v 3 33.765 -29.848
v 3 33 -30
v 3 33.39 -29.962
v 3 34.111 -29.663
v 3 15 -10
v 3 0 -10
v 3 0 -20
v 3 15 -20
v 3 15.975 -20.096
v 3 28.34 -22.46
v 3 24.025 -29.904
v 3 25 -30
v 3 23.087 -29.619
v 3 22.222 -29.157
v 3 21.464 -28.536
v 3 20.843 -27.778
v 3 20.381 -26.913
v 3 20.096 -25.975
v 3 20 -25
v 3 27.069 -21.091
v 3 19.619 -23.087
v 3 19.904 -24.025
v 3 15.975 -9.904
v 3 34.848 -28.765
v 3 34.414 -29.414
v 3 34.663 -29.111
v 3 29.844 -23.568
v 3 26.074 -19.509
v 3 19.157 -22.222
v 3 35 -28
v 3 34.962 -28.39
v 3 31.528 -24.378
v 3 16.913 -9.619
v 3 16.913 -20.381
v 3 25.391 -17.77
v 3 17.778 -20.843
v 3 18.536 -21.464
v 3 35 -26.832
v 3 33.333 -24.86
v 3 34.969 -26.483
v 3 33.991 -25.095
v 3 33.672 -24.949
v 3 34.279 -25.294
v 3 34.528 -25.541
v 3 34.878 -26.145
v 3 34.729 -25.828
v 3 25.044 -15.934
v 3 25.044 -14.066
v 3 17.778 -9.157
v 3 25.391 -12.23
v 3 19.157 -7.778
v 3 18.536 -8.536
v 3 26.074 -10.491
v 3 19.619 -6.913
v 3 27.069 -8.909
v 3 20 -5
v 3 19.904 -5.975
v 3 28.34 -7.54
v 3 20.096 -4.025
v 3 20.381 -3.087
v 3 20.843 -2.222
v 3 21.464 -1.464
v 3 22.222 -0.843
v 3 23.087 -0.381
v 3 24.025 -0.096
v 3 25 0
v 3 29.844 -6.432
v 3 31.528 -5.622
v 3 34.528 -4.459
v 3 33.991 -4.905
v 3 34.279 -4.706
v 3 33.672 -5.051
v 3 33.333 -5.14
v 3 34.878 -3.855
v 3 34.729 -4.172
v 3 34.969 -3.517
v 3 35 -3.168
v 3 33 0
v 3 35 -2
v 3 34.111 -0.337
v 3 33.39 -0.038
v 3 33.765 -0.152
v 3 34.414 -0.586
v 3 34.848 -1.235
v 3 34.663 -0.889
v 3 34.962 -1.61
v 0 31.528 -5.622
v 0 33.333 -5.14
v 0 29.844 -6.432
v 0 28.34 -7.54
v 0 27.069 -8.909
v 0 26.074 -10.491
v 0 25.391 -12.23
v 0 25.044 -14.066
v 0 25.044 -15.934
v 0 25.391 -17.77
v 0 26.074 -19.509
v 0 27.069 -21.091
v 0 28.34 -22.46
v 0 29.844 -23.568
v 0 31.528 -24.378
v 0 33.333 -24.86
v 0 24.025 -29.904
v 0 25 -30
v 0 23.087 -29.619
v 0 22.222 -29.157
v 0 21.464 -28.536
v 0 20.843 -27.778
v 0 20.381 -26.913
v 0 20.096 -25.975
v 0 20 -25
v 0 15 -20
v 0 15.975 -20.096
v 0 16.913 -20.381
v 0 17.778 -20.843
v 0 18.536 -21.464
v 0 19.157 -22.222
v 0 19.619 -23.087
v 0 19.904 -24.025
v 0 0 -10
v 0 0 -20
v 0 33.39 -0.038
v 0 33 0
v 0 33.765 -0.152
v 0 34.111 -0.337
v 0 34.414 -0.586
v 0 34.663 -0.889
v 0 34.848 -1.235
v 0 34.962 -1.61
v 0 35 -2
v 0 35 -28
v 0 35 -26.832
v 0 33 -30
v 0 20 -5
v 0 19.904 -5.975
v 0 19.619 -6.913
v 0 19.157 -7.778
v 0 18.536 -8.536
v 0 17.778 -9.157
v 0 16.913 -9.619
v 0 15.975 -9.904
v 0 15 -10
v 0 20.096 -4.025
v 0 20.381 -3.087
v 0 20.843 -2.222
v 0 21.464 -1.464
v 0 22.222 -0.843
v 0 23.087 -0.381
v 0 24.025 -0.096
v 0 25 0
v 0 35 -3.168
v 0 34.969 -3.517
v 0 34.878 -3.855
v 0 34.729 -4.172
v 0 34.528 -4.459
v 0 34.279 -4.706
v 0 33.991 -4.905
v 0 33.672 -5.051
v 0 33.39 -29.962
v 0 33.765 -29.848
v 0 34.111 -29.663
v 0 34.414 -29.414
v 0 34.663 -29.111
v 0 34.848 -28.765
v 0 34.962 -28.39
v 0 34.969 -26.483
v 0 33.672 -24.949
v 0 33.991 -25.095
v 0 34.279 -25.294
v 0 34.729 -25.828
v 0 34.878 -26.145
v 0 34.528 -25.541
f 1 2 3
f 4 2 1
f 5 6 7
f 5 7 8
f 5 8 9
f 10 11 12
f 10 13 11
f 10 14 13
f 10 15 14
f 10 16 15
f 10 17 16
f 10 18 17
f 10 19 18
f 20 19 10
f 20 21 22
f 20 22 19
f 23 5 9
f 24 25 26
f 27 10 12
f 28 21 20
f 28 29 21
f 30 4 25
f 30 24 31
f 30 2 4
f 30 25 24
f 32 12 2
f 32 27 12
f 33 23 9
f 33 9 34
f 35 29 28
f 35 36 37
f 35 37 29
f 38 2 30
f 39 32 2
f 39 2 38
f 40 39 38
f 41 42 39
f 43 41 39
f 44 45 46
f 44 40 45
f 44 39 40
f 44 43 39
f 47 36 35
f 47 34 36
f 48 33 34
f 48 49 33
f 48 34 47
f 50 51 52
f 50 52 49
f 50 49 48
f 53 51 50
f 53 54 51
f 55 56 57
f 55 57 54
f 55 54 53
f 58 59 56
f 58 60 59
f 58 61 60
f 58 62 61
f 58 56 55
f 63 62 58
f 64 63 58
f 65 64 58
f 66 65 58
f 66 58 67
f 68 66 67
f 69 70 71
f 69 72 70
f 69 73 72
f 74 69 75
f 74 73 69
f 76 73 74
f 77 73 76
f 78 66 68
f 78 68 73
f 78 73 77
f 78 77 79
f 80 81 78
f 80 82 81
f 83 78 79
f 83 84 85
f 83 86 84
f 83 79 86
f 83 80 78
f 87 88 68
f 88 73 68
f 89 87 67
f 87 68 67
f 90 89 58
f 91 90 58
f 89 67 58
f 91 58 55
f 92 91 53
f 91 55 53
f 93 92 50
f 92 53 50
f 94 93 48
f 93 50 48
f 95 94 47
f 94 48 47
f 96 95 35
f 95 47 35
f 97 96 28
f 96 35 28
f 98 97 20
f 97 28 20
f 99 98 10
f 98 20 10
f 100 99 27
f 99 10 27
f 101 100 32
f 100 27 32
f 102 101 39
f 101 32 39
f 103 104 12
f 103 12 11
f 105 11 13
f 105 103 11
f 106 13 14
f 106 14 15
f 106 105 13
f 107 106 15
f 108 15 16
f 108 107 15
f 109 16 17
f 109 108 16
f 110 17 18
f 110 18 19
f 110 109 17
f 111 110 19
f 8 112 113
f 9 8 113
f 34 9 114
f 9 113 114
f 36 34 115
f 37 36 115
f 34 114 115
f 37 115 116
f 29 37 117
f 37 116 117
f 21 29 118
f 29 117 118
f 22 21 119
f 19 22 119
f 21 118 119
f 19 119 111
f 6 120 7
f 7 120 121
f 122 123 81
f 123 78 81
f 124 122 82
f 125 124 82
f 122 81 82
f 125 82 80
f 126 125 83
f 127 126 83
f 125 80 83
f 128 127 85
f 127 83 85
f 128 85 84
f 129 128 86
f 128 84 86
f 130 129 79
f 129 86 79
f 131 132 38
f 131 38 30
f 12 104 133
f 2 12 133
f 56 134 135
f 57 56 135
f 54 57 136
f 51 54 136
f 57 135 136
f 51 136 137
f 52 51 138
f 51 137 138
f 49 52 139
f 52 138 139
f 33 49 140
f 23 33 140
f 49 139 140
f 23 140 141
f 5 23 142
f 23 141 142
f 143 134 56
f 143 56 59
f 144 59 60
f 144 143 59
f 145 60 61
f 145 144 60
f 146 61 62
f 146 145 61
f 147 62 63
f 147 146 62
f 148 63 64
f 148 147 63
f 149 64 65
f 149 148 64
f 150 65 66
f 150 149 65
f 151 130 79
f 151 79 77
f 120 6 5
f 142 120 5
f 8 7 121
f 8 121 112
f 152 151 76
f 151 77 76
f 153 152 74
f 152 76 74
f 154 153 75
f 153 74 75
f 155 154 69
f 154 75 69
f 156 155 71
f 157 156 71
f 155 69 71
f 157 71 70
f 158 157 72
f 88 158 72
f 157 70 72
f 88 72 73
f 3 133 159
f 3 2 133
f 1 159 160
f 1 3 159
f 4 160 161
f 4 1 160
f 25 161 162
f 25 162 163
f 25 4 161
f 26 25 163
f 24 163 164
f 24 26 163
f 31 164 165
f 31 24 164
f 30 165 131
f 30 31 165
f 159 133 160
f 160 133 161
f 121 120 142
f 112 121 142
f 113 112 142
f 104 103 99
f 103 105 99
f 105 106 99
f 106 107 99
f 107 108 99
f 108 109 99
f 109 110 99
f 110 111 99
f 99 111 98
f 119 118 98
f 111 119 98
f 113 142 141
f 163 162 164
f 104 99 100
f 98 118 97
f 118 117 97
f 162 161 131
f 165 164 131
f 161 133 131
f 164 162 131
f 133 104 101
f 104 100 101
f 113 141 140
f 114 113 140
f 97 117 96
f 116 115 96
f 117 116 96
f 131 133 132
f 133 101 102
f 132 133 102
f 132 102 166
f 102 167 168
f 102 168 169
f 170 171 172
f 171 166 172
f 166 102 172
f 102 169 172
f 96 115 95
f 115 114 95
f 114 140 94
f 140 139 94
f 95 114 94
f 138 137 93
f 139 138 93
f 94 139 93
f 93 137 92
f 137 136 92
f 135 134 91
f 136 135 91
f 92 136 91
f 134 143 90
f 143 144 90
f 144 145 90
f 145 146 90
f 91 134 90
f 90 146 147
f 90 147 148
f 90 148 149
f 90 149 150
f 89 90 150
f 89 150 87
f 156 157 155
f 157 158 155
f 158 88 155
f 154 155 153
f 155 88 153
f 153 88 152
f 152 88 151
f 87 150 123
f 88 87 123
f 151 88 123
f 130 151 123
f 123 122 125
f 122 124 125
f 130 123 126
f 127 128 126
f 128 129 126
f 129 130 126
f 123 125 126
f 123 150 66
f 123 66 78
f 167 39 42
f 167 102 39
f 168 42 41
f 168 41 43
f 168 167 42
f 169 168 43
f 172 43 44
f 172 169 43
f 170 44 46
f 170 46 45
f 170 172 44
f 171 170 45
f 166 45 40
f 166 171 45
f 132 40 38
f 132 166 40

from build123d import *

# Parameters (mm, degrees)
SKETCH1_W           = 30
SKETCH1_H           = 35
BOSS_EXTRUDE1_DEPTH = 3
SKETCH2_W           = 10
SKETCH2_H           = 20
CUT_EXTRUDE1_DEPTH  = 3
SKETCH5_R           = 10
CUT_EXTRUDE2_DEPTH  = 3
FILLET1_DEPTH       = 3
FILLET1_2_DEPTH     = 3
FILLET2_R           = 2


with BuildPart() as part:
    # Sketch1 → Boss-Extrude1 (new body)
    with BuildSketch(Plane(origin=(0, 0, 0), x_dir=(0, 0, -1), z_dir=(1, 0, 0))):
        with Locations((15, 17.5)):
            Rectangle(SKETCH1_W, SKETCH1_H)
    extrude(amount=BOSS_EXTRUDE1_DEPTH)

    # Sketch2 → Cut-Extrude1 (cut)
    with BuildSketch(Plane(origin=(3, 0, 0), x_dir=(0, 0, -1), z_dir=(1, 0, 0))):
        with Locations((5, 10)):
            Rectangle(SKETCH2_W, SKETCH2_H)
        with Locations((25, 10)):
            Rectangle(SKETCH2_W, SKETCH2_H)
    extrude(amount=-CUT_EXTRUDE1_DEPTH, mode=Mode.SUBTRACT)

    # Sketch5 → Cut-Extrude2 (cut)
    with BuildSketch(Plane(origin=(3, 0, 0), x_dir=(0, 0, -1), z_dir=(1, 0, 0))):
        with Locations((15, 35)):
            Circle(SKETCH5_R)
    extrude(amount=-CUT_EXTRUDE2_DEPTH, mode=Mode.SUBTRACT)

    # Fillet1: read off the stored shape, not the designer's step
    # Fillet1 outline → Fillet1 (cut)
    with BuildSketch(Plane.YZ):
        with BuildLine():
            ThreePointArc((25, -30), (21.464466094, -28.535533906), (20, -25))
            Line((20, -25), (20, -30))
            Line((20, -30), (25, -30))
        make_face()
        with BuildLine():
            Line((20, 0), (20, -5))
            ThreePointArc((20, -5), (21.464466094, -1.464466094), (25, 0))
            Line((25, 0), (20, 0))
        make_face()
    extrude(amount=FILLET1_DEPTH, mode=Mode.SUBTRACT)

    # Fillet1 2 outline → Fillet1 2 (add)
    with BuildSketch(Plane.YZ):
        with BuildLine():
            Line((20, -20), (15, -20))
            ThreePointArc((15, -20), (18.535533906, -21.464466094), (20, -25))
            Line((20, -25), (20, -20))
        make_face()
        with BuildLine():
            Line((20, -10), (20, -5))
            ThreePointArc((20, -5), (18.535533906, -8.535533906), (15, -10))
            Line((15, -10), (20, -10))
        make_face()
    extrude(amount=FILLET1_2_DEPTH)

    # Fillet2
    fillet2_edges = [part.edges().sort_by_distance(p)[0] for p in [
        (1.5, 35, -25),
        (1.5, 35, -5),
        (1.5, 35, 0),
        (1.5, 35, -30),
    ]]
    fillet(fillet2_edges, radius=FILLET2_R)


solid = part.part
